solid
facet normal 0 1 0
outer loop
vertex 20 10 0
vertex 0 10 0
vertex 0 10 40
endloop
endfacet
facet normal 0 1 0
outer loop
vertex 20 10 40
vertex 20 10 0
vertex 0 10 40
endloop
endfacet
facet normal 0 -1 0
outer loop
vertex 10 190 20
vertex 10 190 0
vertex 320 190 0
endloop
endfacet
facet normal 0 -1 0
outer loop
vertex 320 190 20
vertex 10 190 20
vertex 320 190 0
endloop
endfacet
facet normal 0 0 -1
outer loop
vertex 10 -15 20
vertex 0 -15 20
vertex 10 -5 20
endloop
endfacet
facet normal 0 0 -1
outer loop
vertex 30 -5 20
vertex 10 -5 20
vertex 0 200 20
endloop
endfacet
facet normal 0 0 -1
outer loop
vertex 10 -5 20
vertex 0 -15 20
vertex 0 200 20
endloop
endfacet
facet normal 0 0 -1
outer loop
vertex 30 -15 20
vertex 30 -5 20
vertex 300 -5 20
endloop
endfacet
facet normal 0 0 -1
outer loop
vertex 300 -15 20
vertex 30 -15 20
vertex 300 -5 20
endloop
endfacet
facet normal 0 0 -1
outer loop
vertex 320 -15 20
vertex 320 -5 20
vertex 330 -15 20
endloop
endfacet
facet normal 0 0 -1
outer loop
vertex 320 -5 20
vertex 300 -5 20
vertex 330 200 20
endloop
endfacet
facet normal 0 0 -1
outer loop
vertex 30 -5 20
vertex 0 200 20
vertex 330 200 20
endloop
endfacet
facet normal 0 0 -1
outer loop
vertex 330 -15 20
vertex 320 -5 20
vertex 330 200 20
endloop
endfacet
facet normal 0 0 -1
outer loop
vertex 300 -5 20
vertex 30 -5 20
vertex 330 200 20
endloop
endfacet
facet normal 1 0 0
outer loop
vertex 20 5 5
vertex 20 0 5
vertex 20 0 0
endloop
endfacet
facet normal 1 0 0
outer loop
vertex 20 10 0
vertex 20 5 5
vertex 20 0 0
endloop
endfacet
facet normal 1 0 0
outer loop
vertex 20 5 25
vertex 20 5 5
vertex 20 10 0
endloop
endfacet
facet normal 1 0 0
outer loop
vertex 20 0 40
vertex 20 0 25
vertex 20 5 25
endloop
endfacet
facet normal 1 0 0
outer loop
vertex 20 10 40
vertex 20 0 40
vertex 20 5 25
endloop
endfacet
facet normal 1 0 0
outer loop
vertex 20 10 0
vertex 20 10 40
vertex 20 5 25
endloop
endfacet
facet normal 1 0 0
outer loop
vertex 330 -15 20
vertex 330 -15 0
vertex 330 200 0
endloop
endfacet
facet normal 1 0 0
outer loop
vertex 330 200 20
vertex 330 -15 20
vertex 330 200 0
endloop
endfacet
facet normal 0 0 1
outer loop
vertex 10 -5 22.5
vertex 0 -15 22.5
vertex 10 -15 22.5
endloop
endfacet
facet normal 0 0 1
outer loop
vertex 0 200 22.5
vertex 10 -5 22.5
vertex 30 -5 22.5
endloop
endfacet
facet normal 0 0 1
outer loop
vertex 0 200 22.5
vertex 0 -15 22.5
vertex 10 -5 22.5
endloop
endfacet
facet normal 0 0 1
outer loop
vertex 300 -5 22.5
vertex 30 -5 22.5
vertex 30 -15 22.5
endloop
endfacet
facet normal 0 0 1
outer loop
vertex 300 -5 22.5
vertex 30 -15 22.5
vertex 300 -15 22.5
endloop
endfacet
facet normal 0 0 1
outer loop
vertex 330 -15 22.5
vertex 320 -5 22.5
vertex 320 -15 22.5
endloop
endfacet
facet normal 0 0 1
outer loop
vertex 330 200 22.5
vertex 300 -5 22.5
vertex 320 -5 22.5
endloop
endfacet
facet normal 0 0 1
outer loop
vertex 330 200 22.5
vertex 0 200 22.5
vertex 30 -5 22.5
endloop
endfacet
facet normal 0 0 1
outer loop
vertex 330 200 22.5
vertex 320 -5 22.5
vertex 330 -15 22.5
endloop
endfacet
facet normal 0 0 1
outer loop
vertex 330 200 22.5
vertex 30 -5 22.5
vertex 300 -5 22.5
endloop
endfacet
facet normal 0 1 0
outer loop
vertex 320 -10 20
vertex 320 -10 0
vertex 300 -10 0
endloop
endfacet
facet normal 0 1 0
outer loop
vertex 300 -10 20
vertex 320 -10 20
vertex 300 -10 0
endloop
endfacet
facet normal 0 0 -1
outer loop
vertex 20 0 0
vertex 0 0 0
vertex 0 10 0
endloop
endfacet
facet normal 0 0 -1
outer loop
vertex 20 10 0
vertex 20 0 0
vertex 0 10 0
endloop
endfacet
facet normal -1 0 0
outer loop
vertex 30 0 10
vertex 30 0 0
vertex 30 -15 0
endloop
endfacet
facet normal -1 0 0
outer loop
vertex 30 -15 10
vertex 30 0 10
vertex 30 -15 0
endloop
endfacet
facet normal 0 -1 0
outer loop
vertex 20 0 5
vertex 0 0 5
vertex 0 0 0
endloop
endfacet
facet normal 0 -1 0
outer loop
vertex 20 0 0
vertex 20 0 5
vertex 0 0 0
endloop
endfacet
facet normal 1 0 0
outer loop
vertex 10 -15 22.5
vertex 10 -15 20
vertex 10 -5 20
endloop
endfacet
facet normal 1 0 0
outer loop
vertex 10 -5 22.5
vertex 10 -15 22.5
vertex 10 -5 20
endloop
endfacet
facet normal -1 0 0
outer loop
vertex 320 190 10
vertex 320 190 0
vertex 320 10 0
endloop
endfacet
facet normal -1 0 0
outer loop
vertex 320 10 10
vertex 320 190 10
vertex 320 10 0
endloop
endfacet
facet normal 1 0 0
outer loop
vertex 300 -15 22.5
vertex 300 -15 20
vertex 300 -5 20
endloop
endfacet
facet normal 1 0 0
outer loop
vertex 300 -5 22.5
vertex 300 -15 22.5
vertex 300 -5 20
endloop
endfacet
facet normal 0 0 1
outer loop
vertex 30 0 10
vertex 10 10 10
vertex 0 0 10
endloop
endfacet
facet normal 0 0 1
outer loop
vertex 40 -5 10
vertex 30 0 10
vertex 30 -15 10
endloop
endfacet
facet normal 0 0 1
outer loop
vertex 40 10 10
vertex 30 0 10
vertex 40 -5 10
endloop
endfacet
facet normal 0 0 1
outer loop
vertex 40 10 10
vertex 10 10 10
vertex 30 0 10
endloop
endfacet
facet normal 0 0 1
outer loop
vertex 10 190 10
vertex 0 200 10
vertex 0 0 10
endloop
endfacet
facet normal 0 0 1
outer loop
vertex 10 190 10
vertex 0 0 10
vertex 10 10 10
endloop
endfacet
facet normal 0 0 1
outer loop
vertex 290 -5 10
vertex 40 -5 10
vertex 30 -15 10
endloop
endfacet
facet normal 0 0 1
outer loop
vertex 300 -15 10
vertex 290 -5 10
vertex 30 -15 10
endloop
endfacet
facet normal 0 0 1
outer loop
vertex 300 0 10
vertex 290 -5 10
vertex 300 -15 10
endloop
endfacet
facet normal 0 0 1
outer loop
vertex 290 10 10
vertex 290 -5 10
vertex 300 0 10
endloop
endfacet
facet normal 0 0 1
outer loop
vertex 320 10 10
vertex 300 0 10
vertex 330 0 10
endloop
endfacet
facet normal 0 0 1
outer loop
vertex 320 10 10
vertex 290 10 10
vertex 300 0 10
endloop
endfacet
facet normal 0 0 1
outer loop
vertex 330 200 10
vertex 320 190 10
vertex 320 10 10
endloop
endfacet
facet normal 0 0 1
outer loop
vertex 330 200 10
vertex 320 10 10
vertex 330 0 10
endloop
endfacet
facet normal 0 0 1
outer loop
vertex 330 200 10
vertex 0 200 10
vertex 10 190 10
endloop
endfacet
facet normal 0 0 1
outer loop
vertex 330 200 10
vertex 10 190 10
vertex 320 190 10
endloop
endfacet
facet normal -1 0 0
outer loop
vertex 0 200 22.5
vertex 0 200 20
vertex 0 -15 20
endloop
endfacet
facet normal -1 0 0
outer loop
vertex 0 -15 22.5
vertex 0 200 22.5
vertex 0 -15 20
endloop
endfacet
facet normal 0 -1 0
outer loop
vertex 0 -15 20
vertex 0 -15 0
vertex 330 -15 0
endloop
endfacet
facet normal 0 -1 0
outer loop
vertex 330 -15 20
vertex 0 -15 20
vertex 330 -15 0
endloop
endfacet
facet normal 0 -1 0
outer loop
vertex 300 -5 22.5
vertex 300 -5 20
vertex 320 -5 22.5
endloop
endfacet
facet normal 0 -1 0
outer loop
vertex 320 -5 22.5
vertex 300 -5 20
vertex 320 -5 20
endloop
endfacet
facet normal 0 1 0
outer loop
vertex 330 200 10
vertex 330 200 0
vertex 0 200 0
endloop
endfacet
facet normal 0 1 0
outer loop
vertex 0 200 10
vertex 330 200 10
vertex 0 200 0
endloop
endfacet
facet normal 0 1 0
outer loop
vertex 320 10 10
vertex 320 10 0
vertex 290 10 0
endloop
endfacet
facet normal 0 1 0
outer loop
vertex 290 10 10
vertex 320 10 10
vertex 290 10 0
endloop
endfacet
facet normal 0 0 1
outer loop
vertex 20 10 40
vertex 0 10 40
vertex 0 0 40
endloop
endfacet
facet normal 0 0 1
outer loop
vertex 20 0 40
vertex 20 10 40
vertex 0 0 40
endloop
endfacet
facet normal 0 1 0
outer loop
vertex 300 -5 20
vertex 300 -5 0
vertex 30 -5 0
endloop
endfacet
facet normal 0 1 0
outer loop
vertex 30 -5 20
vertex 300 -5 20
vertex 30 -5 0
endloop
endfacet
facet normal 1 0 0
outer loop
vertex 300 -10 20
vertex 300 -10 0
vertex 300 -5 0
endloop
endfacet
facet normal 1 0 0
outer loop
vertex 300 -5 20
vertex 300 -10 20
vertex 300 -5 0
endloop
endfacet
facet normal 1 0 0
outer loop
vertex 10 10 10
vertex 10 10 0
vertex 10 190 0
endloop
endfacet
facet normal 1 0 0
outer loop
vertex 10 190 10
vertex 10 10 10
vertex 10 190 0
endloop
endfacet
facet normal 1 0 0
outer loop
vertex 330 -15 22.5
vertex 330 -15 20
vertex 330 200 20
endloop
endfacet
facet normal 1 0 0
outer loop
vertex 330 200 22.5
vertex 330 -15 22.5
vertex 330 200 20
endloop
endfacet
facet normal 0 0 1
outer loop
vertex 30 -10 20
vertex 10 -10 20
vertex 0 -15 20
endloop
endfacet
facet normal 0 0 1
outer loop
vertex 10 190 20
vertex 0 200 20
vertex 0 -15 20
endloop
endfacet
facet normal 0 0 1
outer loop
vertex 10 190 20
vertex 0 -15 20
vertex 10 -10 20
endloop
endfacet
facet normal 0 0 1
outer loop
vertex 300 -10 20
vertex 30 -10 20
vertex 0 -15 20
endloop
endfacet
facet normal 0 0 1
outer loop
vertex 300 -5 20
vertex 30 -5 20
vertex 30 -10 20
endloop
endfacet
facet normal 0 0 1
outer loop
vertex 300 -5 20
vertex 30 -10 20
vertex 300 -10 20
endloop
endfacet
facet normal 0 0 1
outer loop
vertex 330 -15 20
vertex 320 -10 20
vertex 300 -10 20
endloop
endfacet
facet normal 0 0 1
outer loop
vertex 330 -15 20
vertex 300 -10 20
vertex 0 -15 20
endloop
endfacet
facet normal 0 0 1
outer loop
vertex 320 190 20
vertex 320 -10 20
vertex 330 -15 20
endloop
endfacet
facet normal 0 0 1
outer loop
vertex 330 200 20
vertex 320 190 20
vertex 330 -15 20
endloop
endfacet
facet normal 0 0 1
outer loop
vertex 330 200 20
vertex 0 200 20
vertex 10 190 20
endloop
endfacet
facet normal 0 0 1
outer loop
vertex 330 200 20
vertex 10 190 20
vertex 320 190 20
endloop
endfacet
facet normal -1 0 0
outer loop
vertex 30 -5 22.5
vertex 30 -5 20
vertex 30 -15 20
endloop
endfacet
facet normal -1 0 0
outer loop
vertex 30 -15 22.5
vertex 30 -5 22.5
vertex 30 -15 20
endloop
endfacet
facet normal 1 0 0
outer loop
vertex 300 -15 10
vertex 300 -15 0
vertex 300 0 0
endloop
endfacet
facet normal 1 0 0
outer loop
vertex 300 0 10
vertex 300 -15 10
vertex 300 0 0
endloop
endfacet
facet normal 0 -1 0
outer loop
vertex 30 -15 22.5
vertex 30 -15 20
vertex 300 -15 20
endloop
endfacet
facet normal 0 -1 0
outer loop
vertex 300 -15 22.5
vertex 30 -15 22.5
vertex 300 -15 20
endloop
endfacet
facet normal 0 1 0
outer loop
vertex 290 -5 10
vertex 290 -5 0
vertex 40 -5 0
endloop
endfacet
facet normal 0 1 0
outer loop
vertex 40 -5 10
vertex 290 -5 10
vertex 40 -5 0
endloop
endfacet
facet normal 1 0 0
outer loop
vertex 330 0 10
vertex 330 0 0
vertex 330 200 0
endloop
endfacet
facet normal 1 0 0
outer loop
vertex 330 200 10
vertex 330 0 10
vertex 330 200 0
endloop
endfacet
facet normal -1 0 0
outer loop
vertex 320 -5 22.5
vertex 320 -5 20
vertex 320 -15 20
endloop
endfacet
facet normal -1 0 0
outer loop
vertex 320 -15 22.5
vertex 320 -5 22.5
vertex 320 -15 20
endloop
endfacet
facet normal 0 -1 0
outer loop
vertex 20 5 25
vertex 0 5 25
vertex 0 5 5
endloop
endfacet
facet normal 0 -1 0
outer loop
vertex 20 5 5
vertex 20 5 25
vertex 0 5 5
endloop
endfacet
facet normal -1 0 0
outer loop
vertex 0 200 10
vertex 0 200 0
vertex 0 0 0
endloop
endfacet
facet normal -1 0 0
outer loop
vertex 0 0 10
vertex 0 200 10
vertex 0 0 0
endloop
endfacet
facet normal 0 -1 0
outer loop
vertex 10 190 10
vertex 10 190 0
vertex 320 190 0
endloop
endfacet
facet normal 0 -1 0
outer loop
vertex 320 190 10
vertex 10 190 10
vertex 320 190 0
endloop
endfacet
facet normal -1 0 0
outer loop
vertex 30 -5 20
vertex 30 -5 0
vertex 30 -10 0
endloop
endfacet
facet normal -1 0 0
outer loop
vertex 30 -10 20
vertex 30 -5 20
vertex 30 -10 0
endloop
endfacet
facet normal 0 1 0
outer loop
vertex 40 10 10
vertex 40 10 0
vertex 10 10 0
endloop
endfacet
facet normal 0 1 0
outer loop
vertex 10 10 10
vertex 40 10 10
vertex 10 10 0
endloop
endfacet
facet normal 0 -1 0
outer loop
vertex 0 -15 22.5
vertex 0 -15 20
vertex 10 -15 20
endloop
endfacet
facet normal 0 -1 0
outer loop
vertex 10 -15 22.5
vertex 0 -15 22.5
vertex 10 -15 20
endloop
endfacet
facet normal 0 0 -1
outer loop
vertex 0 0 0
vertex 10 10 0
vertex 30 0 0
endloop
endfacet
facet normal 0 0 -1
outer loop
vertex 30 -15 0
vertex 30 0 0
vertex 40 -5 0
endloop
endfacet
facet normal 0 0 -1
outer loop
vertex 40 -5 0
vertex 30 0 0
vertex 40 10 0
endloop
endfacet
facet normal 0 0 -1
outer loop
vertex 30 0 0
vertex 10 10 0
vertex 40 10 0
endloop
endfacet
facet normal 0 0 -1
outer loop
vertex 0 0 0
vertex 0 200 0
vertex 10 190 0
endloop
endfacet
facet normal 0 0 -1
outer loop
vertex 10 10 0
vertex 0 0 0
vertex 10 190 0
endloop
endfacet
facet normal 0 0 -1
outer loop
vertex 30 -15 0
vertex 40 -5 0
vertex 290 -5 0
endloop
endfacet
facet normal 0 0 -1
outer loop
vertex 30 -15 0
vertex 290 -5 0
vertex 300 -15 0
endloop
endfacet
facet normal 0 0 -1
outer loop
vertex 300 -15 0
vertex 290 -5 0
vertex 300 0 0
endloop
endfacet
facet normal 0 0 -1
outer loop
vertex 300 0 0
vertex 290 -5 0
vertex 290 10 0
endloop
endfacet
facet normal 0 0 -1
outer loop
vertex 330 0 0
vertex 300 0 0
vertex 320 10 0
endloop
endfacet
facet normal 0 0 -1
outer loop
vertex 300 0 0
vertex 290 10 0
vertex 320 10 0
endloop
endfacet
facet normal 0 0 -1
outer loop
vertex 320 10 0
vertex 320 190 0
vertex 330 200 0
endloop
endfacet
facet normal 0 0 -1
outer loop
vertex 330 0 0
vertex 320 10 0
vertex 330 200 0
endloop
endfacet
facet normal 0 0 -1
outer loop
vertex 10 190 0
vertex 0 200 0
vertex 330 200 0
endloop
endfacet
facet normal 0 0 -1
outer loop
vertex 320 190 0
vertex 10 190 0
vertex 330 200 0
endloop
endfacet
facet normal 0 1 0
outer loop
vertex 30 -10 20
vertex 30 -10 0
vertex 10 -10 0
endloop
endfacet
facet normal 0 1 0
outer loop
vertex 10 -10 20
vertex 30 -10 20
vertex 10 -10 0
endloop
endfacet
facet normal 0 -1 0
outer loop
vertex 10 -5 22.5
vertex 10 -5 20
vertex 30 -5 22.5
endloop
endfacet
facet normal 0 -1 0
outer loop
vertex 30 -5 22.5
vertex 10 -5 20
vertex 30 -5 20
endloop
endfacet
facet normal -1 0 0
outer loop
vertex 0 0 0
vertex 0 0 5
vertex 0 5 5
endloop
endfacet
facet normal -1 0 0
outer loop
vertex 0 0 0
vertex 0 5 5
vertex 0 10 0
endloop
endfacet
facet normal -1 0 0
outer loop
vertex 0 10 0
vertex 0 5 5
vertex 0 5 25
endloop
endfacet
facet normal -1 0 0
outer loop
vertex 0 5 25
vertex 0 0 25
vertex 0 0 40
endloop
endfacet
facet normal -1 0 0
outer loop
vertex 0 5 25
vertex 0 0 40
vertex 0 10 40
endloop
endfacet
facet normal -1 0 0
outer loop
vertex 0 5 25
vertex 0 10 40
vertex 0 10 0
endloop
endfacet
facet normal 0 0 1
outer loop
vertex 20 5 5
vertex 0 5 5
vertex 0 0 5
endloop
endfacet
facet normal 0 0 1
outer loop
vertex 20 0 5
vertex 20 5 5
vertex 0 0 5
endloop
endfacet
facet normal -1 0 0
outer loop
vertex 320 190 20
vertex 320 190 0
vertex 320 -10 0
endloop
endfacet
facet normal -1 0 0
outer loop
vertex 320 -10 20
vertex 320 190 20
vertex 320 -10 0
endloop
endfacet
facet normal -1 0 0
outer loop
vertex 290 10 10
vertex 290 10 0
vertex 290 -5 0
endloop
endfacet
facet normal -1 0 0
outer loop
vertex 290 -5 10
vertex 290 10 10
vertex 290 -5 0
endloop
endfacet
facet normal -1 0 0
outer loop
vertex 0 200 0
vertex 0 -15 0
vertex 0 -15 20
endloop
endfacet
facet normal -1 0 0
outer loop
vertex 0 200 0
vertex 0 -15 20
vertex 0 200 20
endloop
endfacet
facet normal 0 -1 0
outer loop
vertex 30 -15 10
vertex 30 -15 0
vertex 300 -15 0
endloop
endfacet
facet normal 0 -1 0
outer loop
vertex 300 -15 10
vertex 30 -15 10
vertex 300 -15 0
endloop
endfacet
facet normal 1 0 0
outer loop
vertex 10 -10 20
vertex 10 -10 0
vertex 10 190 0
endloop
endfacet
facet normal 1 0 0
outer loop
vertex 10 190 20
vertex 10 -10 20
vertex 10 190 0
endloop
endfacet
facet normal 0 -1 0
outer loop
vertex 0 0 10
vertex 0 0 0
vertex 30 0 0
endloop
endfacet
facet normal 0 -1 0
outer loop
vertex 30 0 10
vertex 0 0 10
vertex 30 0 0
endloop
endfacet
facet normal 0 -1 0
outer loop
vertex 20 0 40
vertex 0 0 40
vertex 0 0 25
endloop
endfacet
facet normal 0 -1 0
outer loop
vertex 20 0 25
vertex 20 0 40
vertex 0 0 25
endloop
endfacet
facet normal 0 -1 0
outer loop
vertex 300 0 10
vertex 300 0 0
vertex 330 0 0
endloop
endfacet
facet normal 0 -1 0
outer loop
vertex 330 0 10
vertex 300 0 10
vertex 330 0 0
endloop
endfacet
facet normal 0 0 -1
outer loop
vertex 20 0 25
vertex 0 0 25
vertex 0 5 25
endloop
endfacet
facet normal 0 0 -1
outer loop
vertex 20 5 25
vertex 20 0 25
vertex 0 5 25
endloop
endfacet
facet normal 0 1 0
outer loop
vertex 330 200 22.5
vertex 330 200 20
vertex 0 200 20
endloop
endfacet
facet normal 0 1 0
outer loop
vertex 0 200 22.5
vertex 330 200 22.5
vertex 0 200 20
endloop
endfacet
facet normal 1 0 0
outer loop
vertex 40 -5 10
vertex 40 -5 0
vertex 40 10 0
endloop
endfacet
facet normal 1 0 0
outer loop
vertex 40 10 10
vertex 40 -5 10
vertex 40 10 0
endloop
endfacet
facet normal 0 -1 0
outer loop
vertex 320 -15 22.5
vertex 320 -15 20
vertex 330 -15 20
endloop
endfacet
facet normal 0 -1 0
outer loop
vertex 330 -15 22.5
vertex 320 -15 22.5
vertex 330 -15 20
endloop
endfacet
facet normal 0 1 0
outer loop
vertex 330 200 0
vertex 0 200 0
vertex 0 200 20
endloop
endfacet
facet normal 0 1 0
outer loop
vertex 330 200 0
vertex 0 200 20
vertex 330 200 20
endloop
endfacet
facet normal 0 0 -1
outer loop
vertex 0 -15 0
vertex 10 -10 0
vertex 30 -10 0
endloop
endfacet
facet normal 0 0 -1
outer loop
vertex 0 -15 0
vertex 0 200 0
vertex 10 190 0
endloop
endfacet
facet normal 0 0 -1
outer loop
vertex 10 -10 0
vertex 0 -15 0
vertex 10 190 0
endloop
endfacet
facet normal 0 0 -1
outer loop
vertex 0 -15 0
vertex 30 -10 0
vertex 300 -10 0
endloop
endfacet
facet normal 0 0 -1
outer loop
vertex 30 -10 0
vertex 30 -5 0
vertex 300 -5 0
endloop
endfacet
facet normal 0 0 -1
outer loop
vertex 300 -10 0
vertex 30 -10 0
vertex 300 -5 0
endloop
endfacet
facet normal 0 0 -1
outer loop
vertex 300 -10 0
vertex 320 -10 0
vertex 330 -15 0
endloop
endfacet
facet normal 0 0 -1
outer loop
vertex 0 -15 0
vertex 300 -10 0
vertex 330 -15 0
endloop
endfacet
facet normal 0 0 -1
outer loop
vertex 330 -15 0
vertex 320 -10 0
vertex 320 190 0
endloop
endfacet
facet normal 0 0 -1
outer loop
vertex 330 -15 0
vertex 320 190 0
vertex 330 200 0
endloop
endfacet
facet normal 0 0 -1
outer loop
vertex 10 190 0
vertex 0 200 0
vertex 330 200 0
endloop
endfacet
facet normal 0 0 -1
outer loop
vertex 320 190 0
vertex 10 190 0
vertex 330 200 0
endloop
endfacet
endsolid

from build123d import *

# Parameters (mm, degrees)
F1_DEPTH = 10
F2_W     = 330
F2_H     = 215
F3_DEPTH = 20
F5_DEPTH = 20
F7_DEPTH = 2.5


with BuildPart() as f1:
    # F0 (on Top) → F1 (new body)
    with BuildSketch(Plane.XY):
        Polygon((330, 200), (0, 200), (0, 0), (30, 0), (30, -15), (300, -15), (300, 0), (330, 0), align=None)
        Polygon((10, 10), (10, 190), (320, 190), (320, 10), (290, 10), (290, -5), (40, -5), (40, 10), align=None, mode=Mode.SUBTRACT)
    extrude(amount=F1_DEPTH)


with BuildPart() as f3:
    # F2 (on Top) → F3 (new body)
    with BuildSketch(Plane.XY):
        with Locations((165, 92.5)):
            Rectangle(F2_W, F2_H)
        Polygon((10, -5), (10, 190), (320, 190), (320, -5), (320, -10), (300, -10), (300, -5), (30, -5), (30, -10), (10, -10), align=None, mode=Mode.SUBTRACT)
    extrude(amount=F3_DEPTH)


with BuildPart() as f5:
    # F4 (on Right) → F5 (new body)
    with BuildSketch(Plane.YZ):
        Polygon((0, 5), (0, 0), (10, 0), (10, 40), (0, 40), (0, 25), (5, 25), (5, 5), align=None)
    extrude(amount=F5_DEPTH)


with BuildPart() as f7:
    # F6 (on face) → F7 (new body)
    with BuildSketch(Plane.XY.offset(20)):
        Polygon((330, 200), (0, 200), (0, -15), (10, -15), (10, -5), (30, -5), (30, -15), (300, -15), (300, -5), (320, -5), (320, -15), (330, -15), align=None)
    extrude(amount=F7_DEPTH)


solid = Compound([f1.part, f3.part, f5.part, f7.part])
